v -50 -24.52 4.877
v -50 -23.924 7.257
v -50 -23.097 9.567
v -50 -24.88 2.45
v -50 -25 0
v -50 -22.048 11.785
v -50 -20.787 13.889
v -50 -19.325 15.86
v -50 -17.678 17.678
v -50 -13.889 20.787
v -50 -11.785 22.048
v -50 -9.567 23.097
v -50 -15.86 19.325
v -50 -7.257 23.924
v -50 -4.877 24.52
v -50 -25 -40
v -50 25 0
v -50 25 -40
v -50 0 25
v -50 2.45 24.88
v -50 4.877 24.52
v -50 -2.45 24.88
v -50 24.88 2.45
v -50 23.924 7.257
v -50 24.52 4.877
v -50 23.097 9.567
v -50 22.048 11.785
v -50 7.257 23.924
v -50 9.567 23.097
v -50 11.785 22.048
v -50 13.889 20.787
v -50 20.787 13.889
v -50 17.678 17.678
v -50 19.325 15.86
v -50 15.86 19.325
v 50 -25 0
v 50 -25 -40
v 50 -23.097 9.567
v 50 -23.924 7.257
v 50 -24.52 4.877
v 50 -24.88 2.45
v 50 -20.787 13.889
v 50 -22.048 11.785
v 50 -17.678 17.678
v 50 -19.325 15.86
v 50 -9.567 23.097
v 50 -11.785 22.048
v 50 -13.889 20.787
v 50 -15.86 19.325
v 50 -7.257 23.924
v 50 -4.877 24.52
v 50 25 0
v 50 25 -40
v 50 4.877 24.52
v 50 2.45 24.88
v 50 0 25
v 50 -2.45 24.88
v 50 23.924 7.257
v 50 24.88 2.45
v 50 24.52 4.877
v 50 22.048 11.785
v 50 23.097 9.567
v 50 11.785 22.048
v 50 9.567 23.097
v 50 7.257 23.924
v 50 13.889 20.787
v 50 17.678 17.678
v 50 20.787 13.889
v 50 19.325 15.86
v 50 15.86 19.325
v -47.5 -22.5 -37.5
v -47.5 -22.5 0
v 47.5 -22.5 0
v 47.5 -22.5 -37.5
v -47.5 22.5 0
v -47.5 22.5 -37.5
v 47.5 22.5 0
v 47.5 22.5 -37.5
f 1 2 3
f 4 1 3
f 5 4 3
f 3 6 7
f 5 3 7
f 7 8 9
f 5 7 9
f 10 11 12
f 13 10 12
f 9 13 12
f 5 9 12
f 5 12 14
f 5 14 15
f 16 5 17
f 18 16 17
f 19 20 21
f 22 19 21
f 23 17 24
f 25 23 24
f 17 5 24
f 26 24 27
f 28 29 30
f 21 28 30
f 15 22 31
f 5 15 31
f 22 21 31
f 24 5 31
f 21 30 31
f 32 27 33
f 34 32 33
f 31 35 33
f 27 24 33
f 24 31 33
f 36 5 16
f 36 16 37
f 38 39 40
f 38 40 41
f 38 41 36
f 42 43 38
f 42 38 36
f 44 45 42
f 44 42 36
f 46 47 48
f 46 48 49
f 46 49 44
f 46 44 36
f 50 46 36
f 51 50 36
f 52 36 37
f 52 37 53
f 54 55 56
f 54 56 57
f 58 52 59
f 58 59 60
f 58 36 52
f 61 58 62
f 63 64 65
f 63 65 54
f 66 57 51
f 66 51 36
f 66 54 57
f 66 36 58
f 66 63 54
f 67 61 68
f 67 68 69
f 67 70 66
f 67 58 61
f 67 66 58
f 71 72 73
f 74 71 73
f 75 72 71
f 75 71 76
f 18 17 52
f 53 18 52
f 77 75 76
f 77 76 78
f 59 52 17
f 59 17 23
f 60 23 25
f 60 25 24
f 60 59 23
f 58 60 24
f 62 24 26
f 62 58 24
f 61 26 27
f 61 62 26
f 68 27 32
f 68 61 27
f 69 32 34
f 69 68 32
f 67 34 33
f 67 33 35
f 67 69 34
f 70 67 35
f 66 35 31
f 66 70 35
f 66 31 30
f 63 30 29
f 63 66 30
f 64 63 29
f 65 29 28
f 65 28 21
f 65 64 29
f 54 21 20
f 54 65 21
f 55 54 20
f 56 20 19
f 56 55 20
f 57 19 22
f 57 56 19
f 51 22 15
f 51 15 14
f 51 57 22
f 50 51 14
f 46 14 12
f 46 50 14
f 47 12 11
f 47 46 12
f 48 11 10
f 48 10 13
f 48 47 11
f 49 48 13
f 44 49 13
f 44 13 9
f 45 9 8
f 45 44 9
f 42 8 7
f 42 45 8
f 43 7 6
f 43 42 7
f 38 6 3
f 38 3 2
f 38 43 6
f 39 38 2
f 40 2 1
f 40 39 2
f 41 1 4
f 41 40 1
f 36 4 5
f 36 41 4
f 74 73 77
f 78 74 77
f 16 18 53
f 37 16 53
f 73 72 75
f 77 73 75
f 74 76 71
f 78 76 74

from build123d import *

# Parameters (mm, degrees)
F0_W     = 100
F0_H     = 50
F1_DEPTH = 40
F2_T     = -2.5
F4_DEPTH = 50


with BuildPart() as f1:
    # F0 (on Top) → F1 (new body)
    with BuildSketch(Plane.XY):
        Rectangle(F0_W, F0_H)
    extrude(amount=-F1_DEPTH)

    # F2
    f2_openings = [f1.faces().sort_by_distance(p)[0] for p in [
        (0, 0, 0),
    ]]
    offset(amount=F2_T, openings=f2_openings)

    # F3 (on Right) → F4 (join, symmetric)
    with BuildSketch(Plane.YZ):
        with BuildLine():
            Line((-25, 0), (25, 0))
            ThreePointArc((25, 0), (0, 25), (-25, 0))
        make_face()
    extrude(amount=F4_DEPTH, both=True)


solid = f1.part
